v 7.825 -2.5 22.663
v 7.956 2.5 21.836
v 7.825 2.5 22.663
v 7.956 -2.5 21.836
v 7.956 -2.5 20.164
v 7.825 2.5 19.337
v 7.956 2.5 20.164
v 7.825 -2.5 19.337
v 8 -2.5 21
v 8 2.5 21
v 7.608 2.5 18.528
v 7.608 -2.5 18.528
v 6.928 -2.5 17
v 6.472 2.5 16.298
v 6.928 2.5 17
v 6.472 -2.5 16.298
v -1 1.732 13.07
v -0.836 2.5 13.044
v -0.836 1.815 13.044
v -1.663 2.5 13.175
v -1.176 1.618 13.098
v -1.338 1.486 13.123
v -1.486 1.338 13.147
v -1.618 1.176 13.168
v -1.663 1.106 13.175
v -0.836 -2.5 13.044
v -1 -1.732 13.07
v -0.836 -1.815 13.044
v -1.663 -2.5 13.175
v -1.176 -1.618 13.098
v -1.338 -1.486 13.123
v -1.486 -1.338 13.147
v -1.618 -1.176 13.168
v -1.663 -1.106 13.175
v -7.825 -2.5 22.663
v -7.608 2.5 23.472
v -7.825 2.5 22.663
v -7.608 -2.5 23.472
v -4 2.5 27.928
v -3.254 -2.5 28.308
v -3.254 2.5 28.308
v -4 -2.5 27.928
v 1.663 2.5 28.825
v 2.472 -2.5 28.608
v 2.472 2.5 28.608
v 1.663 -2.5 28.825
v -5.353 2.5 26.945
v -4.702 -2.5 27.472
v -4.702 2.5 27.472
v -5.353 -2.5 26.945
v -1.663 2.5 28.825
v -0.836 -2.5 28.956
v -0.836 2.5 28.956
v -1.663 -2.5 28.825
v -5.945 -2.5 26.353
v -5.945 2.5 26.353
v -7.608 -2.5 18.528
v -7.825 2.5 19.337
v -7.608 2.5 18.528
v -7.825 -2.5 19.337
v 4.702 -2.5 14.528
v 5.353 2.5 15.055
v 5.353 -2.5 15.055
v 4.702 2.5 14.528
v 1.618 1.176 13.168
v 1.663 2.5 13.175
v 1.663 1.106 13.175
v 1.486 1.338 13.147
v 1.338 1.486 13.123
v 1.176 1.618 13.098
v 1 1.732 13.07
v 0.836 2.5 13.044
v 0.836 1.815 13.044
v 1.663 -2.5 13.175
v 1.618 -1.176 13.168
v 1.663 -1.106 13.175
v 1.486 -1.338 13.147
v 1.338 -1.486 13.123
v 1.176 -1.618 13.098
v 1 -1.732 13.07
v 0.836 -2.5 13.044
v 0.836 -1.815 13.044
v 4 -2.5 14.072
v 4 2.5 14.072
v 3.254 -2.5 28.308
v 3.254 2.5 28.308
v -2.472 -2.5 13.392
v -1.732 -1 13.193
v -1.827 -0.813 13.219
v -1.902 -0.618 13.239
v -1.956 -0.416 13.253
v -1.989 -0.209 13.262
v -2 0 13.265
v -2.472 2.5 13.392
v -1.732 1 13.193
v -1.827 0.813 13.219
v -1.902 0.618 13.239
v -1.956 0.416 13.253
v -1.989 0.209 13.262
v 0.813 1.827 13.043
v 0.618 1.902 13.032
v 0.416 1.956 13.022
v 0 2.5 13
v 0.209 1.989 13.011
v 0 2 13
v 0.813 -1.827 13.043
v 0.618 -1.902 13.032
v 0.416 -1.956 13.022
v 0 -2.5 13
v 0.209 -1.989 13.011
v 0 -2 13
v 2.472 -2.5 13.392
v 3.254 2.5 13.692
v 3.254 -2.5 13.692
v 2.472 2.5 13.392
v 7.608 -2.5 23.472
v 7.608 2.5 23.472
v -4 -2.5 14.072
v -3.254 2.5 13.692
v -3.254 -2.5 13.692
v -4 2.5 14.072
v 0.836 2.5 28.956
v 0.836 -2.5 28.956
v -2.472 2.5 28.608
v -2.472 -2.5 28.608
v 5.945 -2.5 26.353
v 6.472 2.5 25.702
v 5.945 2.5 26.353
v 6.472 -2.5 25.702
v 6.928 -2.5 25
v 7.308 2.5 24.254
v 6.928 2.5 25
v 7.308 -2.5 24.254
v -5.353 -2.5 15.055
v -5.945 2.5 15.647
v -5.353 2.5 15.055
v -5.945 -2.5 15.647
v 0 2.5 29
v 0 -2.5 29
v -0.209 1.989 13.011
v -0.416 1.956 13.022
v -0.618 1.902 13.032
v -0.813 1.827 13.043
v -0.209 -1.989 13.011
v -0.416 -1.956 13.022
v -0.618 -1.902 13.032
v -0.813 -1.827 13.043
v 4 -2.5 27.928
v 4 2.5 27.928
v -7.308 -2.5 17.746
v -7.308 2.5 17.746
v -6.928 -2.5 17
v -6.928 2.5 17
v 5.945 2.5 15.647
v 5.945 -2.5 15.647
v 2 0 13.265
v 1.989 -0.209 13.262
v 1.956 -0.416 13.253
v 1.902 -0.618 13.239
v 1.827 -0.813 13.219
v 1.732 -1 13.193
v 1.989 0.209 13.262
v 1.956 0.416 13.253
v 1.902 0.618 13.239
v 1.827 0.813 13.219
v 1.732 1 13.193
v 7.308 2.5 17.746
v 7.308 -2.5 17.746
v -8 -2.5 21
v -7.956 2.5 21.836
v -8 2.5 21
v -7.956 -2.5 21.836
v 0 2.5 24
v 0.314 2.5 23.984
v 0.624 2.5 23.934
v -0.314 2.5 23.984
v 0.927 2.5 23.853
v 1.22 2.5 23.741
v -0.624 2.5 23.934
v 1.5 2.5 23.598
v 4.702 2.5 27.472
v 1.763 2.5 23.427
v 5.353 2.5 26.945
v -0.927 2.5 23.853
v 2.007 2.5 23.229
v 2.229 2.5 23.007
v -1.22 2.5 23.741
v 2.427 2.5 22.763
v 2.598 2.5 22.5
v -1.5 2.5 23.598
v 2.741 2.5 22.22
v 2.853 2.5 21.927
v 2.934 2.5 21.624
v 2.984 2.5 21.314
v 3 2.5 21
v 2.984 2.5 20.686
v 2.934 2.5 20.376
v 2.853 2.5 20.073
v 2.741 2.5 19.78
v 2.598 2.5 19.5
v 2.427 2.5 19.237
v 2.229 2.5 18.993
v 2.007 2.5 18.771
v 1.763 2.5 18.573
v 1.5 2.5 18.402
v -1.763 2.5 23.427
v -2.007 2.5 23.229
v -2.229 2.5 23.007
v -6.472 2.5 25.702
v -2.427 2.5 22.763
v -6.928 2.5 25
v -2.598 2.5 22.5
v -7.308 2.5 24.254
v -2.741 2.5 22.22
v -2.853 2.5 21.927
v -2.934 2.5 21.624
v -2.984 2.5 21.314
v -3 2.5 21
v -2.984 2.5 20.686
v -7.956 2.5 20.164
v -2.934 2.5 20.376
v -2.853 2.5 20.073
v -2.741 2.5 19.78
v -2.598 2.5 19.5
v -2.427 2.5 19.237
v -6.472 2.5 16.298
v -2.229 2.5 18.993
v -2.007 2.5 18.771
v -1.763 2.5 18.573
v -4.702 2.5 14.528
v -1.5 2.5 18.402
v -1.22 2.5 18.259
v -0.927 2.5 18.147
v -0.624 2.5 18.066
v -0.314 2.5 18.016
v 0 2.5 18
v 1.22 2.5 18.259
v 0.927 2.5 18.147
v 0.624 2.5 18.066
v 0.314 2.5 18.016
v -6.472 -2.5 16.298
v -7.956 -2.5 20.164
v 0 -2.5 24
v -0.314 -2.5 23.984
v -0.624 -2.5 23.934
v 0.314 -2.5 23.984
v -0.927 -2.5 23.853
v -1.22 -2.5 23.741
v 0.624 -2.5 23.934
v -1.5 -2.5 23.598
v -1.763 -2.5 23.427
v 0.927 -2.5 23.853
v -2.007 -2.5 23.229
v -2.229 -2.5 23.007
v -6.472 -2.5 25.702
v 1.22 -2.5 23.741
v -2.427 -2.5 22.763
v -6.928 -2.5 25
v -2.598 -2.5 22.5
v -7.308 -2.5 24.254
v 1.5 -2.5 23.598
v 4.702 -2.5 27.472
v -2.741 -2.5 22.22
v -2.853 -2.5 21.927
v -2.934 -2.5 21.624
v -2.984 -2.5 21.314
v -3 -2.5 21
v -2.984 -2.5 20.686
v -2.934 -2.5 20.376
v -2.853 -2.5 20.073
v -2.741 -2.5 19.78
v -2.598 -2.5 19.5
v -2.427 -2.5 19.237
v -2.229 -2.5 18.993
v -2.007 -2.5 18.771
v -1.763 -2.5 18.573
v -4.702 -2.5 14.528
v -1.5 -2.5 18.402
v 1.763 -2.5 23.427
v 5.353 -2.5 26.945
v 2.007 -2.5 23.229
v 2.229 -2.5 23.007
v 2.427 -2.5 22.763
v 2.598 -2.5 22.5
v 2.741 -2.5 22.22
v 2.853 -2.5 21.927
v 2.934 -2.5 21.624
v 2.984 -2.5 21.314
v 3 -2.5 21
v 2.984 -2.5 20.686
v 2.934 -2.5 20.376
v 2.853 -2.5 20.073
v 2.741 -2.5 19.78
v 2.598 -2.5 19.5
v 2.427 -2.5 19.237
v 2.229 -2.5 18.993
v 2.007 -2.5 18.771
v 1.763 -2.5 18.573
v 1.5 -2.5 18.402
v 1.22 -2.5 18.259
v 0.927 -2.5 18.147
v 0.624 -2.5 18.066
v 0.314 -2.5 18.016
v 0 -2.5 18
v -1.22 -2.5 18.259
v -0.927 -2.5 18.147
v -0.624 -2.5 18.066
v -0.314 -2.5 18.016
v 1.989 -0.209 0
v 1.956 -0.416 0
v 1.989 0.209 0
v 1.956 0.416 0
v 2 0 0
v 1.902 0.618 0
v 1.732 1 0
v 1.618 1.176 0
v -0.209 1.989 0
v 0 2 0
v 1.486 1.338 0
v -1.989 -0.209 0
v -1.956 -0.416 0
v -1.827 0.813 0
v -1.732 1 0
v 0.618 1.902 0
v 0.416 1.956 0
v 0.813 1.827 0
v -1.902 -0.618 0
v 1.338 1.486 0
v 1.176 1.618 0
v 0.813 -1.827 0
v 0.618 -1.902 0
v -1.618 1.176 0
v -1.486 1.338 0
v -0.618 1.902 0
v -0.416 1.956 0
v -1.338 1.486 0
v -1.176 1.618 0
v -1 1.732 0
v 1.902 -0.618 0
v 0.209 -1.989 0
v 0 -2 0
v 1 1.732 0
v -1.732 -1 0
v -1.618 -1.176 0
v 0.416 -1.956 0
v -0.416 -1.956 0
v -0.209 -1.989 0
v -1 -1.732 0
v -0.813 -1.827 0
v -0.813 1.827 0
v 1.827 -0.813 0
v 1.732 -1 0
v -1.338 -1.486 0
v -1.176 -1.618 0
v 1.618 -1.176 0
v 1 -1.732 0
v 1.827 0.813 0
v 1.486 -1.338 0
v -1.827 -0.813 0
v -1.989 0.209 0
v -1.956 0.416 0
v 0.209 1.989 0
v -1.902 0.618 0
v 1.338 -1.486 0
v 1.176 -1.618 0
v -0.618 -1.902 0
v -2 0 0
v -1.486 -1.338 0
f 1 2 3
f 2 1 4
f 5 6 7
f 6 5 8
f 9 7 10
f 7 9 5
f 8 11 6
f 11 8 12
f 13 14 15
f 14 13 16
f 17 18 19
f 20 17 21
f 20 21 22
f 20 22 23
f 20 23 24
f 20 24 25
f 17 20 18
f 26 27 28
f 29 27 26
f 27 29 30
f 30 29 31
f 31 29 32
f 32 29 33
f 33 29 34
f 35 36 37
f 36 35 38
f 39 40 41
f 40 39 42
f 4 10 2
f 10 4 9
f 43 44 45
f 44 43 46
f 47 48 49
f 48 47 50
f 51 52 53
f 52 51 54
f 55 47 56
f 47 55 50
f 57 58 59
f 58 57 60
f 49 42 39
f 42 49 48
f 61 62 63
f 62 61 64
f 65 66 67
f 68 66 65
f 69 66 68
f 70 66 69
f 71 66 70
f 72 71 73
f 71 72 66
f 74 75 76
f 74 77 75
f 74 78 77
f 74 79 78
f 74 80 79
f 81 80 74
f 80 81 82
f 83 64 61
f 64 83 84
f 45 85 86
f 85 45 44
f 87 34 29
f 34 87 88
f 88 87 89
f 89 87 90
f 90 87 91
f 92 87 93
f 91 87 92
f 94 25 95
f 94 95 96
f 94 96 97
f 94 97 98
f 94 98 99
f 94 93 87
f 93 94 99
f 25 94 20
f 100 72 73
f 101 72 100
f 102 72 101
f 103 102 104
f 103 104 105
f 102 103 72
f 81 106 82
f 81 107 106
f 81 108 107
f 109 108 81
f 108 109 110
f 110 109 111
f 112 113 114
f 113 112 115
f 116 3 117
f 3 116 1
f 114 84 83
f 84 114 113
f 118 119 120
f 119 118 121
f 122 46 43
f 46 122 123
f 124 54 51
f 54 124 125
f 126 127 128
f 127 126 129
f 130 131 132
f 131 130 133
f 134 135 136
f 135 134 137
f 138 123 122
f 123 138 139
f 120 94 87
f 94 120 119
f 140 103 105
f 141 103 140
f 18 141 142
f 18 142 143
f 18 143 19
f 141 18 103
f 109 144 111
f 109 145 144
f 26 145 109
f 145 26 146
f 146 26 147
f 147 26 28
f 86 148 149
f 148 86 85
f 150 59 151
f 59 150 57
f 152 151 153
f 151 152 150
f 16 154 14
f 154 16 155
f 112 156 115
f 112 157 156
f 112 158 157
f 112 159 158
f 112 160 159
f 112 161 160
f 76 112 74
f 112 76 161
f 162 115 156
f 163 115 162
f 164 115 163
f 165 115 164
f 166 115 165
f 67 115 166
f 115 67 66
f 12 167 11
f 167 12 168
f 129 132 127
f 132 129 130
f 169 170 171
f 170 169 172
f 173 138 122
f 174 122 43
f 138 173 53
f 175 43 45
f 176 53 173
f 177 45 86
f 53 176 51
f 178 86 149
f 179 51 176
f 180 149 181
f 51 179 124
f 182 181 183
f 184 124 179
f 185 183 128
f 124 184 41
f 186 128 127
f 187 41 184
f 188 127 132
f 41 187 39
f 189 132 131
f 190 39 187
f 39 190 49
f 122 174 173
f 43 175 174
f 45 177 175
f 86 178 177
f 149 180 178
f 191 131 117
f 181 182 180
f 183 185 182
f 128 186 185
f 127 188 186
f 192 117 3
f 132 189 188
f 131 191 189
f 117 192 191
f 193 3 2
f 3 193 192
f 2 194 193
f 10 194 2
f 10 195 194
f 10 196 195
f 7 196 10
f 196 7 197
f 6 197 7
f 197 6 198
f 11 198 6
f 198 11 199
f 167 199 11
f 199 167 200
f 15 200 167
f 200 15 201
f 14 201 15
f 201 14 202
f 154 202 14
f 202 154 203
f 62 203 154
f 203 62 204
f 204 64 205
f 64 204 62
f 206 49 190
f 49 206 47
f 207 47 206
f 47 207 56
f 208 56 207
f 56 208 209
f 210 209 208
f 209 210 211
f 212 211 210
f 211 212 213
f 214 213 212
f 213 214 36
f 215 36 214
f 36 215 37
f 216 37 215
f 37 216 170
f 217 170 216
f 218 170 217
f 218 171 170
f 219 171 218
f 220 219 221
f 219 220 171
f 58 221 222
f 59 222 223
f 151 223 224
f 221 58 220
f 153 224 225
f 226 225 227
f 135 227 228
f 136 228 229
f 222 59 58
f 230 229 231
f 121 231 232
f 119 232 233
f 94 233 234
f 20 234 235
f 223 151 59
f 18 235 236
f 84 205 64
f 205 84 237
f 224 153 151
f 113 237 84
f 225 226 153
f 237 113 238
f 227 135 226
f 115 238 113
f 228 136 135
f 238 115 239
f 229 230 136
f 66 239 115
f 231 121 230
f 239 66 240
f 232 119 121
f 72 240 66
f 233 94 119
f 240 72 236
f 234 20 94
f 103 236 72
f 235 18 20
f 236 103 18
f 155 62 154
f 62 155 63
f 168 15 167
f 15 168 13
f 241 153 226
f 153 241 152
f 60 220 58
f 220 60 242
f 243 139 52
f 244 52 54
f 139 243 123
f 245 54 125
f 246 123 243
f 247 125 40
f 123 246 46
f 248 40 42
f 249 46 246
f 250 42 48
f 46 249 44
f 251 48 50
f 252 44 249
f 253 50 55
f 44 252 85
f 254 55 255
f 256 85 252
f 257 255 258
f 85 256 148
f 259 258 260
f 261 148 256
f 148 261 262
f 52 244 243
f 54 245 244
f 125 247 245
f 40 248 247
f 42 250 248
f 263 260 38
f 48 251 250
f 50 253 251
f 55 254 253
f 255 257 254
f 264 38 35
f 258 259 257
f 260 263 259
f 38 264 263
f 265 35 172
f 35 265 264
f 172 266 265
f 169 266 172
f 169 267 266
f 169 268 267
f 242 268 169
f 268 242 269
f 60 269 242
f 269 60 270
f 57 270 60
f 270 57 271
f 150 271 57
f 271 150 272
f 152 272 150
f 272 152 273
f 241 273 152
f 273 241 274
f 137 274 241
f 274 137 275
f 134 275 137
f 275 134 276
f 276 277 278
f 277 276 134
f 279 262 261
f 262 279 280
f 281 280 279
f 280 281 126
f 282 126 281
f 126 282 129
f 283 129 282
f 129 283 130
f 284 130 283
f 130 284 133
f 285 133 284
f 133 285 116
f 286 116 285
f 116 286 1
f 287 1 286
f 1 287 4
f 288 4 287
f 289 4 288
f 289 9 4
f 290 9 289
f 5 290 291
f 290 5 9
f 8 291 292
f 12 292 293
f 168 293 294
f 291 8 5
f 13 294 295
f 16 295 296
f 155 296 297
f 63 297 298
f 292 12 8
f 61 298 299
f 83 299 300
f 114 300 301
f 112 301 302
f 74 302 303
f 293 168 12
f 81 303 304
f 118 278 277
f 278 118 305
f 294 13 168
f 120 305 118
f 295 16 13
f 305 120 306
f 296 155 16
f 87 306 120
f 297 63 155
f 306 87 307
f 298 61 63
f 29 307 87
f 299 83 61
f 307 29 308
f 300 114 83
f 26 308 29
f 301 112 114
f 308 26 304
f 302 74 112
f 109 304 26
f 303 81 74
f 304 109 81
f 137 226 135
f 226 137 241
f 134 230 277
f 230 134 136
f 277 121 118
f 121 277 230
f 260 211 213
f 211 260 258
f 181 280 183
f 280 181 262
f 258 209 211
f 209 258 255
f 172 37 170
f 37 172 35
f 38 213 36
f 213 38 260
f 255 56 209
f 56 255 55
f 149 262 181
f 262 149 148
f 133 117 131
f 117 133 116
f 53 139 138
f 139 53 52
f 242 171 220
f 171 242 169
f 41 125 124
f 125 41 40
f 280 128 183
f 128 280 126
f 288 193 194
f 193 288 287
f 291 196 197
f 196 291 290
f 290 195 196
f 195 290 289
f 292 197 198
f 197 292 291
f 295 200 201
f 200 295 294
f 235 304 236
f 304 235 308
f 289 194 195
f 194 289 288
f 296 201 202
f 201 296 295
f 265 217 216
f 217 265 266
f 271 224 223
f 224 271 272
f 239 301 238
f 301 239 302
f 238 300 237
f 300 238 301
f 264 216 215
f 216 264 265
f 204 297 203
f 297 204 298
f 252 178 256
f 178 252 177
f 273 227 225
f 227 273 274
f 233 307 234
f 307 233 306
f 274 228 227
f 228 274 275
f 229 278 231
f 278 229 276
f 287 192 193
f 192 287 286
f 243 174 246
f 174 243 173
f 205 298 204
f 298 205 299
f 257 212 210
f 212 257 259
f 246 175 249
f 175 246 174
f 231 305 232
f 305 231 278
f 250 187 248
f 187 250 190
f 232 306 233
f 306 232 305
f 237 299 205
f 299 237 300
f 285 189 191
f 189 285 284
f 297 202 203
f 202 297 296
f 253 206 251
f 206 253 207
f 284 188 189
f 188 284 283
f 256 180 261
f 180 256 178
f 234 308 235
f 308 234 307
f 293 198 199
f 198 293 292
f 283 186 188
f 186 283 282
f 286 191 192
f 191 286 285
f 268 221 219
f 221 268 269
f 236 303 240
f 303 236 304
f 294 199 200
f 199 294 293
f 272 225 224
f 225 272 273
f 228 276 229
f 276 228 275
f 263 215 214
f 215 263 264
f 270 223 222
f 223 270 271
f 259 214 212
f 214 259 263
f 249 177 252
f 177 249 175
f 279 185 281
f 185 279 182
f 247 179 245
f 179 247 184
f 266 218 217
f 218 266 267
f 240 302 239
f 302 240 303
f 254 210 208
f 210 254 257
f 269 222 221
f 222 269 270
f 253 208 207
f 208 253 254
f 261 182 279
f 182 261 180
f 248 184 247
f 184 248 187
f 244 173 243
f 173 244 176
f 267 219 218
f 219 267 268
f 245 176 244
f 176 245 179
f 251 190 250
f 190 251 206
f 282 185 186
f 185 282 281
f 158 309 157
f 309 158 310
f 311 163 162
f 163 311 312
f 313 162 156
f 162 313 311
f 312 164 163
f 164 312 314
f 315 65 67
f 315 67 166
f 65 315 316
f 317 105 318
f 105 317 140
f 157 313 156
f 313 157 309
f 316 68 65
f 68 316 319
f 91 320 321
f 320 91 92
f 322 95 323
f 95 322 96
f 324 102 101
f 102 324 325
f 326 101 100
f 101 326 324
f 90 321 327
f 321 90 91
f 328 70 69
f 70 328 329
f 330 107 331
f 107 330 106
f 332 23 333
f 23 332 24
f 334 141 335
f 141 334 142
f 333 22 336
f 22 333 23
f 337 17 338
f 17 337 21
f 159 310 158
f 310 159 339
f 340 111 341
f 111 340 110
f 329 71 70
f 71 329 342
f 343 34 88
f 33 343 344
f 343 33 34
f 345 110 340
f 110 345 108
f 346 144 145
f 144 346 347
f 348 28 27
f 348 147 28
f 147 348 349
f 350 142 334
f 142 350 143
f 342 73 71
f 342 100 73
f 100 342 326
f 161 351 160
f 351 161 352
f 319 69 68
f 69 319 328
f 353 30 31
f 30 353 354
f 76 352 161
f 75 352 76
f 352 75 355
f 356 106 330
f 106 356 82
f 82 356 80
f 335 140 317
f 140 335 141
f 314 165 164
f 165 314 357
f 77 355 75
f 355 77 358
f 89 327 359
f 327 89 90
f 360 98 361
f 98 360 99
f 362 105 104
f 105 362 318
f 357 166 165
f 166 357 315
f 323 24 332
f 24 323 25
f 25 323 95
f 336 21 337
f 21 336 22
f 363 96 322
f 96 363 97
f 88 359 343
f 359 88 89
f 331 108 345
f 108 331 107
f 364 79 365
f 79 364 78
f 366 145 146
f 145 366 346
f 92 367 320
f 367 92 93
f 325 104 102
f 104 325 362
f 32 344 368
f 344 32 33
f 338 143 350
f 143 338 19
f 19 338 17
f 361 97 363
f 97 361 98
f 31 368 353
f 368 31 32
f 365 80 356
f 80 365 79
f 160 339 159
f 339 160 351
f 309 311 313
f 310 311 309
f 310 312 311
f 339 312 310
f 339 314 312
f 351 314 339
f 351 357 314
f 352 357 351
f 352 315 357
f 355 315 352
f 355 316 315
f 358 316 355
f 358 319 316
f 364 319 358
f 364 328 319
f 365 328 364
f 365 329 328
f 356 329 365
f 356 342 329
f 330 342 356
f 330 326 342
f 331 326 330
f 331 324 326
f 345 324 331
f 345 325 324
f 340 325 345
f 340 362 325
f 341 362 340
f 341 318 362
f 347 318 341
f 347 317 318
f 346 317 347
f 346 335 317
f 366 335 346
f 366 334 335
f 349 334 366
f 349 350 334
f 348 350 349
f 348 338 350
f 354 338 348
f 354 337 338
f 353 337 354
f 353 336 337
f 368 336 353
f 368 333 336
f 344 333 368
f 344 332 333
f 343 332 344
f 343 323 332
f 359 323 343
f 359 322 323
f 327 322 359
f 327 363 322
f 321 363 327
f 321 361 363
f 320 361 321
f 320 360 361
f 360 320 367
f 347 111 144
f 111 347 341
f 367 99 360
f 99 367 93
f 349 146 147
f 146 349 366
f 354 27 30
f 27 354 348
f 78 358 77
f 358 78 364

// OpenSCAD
// Flat-eye bolt with a smooth shaft.
$fn = 60;
eps = 0.02;
shaft_d = 4;
shaft_l = 14;
eye_outer_d = 16;
eye_inner_d = eye_outer_d - 2 * 5;
eye_t = 5;
module eye() {
    translate([0, -eye_t / 2, shaft_l + eye_outer_d / 2 - 1]) rotate([-90, 0, 0])
        difference() { cylinder(d = eye_outer_d, h = eye_t); translate([0, 0, -eps]) cylinder(d = eye_inner_d, h = eye_t + 2 * eps); }
}
union() { cylinder(d = shaft_d, h = shaft_l + 2); eye(); }
